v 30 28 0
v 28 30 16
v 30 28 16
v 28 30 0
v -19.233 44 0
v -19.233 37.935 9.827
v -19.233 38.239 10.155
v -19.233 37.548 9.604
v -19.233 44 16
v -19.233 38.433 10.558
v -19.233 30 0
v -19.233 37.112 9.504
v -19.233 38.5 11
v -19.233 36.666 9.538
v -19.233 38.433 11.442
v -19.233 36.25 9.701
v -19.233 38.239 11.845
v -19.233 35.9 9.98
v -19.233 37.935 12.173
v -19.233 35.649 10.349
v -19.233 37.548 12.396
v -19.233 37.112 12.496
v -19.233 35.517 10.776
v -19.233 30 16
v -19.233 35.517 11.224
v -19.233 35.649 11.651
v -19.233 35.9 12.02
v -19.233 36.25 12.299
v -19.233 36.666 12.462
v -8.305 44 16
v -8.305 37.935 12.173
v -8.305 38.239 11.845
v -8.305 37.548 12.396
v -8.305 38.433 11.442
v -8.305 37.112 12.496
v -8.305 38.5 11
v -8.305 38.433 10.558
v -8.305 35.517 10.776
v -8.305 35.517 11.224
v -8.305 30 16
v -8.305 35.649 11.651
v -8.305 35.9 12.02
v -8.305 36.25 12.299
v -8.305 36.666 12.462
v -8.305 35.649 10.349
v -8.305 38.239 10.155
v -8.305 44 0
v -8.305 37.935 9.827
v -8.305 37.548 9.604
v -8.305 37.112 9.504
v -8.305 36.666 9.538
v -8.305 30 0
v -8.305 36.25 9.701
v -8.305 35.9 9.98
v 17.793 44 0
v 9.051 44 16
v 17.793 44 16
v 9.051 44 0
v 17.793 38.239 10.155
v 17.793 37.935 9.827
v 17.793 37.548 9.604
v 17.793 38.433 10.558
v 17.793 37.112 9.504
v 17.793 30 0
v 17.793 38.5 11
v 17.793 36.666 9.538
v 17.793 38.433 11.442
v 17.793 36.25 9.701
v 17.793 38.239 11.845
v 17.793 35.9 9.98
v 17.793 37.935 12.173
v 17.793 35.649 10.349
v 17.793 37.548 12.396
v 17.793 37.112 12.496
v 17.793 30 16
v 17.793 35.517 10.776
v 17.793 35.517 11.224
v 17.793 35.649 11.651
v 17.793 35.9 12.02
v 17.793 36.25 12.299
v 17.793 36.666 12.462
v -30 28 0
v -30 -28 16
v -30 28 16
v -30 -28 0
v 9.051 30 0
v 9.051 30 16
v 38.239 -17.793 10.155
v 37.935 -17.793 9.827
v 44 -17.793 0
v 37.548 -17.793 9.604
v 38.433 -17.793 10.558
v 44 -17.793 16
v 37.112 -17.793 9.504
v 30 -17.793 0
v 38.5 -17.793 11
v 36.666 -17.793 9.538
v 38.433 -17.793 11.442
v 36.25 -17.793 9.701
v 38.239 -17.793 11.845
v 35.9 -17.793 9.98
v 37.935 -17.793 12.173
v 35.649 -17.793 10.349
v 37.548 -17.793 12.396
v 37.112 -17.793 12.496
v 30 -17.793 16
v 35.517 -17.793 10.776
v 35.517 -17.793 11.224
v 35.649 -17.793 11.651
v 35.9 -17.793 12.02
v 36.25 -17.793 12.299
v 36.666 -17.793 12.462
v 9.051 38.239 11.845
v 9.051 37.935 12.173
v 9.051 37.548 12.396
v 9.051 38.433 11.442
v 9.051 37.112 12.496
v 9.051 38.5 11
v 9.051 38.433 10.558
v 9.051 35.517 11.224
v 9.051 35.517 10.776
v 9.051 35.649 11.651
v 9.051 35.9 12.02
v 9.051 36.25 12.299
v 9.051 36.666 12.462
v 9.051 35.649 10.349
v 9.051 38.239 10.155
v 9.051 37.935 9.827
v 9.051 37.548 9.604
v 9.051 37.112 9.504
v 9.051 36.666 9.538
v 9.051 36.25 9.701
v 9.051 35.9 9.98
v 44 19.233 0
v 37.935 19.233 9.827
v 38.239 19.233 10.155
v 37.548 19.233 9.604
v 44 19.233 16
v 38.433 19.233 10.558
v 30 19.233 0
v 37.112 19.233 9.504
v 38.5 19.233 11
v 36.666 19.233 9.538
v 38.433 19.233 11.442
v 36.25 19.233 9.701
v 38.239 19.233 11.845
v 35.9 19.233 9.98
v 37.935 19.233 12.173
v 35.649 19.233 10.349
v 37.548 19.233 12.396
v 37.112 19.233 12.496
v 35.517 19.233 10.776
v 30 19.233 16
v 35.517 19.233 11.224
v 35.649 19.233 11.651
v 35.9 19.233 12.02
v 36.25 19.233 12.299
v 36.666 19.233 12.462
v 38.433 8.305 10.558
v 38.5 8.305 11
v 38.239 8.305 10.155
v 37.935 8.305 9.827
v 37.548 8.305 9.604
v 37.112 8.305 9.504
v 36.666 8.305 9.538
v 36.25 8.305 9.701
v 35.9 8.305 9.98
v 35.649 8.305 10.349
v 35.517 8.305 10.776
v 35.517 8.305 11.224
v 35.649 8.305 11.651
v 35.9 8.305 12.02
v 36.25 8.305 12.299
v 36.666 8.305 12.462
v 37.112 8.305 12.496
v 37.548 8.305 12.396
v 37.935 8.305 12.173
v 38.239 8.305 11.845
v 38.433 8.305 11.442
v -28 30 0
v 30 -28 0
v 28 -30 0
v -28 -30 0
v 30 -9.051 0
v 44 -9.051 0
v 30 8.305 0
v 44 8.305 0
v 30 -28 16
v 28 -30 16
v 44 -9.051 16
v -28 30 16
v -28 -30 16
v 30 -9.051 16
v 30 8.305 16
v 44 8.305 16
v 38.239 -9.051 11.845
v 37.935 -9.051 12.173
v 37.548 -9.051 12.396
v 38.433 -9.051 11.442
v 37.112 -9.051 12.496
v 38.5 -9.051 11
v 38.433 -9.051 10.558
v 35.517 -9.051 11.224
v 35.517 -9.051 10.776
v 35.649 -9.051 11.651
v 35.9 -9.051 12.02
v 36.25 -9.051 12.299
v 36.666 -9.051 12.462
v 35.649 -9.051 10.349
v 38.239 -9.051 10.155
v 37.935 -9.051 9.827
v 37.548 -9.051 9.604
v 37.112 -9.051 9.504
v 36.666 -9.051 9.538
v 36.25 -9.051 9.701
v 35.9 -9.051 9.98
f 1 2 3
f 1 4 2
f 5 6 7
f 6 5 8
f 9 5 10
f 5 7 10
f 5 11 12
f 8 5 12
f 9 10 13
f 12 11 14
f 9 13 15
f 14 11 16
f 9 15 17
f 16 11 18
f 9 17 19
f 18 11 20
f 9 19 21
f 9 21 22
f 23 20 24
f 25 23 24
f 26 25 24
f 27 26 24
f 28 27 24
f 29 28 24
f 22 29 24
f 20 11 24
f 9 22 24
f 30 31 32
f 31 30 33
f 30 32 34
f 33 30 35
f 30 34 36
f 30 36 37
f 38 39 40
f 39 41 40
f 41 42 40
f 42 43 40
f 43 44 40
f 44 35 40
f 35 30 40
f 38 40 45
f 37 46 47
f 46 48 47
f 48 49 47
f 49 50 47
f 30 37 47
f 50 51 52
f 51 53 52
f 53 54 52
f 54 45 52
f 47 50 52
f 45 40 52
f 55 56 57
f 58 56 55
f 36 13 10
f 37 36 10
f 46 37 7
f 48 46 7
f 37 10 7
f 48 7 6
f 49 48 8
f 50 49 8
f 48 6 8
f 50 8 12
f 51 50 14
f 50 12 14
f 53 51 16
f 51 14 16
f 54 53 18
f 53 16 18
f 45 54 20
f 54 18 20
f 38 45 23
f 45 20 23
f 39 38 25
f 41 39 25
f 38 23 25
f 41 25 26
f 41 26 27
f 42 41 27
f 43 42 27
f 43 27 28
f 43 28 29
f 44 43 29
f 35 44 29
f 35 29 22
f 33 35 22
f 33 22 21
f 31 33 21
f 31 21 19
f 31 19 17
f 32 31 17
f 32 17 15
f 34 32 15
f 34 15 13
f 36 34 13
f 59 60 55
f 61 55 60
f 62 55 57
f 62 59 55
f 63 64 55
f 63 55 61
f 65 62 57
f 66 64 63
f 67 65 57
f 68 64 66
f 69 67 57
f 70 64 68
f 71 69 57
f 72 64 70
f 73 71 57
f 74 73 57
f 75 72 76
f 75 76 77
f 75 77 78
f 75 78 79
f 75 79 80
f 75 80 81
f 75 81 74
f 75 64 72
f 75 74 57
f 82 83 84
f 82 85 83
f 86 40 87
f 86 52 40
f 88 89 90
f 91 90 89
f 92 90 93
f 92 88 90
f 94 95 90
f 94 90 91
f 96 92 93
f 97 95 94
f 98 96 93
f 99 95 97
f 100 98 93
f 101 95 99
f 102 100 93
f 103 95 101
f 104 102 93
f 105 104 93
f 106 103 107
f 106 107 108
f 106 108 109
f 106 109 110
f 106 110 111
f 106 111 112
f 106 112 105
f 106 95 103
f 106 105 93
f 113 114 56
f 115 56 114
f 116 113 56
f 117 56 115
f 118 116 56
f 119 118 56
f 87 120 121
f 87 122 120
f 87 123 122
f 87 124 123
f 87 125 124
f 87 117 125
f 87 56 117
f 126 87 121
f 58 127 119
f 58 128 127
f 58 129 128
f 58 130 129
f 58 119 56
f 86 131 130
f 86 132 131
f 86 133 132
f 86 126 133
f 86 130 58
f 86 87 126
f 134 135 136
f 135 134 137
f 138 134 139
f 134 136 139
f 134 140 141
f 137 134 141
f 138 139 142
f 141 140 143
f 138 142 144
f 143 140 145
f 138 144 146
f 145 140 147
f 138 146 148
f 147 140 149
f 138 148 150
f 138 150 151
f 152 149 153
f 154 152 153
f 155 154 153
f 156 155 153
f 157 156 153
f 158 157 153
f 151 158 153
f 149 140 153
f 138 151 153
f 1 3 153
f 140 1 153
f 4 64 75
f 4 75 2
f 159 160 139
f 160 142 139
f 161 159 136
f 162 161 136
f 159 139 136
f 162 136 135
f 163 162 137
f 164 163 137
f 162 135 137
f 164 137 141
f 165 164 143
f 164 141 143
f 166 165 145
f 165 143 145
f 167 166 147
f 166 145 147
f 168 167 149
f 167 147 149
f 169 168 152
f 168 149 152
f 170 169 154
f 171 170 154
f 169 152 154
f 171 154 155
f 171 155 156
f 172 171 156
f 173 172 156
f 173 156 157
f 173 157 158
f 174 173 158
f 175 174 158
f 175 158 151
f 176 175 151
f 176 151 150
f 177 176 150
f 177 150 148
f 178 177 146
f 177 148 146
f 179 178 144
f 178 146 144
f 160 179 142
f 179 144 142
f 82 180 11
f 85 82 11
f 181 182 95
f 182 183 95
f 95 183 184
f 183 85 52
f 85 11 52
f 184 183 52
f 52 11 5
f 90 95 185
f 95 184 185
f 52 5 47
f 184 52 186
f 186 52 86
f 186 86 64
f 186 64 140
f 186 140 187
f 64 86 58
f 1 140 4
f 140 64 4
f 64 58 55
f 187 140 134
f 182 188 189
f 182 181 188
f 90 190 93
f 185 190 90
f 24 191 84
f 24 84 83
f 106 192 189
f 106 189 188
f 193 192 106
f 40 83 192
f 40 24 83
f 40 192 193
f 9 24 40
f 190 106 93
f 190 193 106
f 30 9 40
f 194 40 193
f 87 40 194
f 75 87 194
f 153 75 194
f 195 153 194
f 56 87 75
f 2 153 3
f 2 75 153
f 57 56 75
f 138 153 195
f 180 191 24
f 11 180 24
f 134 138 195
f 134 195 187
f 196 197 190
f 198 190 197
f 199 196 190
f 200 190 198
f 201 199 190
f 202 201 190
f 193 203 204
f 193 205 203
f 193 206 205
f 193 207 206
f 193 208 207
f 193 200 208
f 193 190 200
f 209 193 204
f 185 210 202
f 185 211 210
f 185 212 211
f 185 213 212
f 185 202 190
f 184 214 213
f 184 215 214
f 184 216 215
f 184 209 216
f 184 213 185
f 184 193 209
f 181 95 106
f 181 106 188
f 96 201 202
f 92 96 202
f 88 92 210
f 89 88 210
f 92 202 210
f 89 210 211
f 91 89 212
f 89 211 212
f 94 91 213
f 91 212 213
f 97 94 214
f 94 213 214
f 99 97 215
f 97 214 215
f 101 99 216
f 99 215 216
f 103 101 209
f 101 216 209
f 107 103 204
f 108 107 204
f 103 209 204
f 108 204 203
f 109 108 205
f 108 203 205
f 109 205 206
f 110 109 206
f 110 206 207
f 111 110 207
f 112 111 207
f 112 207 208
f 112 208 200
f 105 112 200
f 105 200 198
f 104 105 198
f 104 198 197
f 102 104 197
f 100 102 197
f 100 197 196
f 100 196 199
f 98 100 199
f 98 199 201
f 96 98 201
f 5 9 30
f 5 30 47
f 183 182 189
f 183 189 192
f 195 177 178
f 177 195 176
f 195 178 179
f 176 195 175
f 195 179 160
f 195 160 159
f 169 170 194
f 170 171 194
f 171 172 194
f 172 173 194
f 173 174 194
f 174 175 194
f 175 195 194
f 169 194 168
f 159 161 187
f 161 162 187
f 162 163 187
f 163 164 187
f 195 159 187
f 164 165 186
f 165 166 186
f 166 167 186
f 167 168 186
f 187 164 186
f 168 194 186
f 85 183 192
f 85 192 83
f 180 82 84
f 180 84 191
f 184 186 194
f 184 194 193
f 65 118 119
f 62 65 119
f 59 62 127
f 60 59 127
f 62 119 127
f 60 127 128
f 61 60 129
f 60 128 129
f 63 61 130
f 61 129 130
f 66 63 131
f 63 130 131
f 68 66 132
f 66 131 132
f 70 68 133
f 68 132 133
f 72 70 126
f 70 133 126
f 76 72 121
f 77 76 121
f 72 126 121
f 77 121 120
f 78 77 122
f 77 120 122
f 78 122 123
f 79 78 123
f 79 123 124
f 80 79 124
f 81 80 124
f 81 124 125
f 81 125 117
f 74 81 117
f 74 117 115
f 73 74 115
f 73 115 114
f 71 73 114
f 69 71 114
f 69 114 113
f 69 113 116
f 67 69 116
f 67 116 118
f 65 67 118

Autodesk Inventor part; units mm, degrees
ref_plane "YZ Plane" through (0, 0, 0) normal (1, 0, 0) x (0, 1, 0)
ref_plane "XZ Plane" through (0, 0, 0) normal (0, 1, 0) x (-1, 0, 0)
ref_plane "XY Plane" through (0, 0, 0) normal (0, 0, 1) x (1, 0, 0)
ref_plane "Work Plane1" through (0, 0, 0) normal (0, 0, 1) x (1, 0, 0)
sketch "Sketch1" plane through (0, 0, 0) normal (0, 0, 1) x (1, 0, 0)
  circle A0 centre (17.5, 17.5) radius 1.95 projected
  circle A1 centre (17.5, -17.5) radius 1.95 projected
  circle A2 centre (-17.5, -17.5) radius 1.95 projected
  circle A3 centre (-17.5, 17.5) radius 1.95 projected
  circle A4 centre (0, 0) radius 7.5 projected
  line L0 (-30, 28) -> (-28, 30) projected
  line L1 (-30, -28) -> (-30, 28) projected
  line L2 (-28, -30) -> (-30, -28) projected
  line L3 (28, -30) -> (-28, -30) projected
  line L4 (30, -28) -> (28, -30) projected
  line L5 (30, 28) -> (30, -28) projected
  line L6 (28, 30) -> (30, 28) projected
  line L7 (-28, 30) -> (28, 30) projected
  circle A5 centre (25, 25) radius 2.325 projected
  circle A6 centre (-25, -25) radius 2.325 projected
  circle A7 centre (25, -25) radius 2.325 projected
  circle A8 centre (-25, 25) radius 2.325 projected
  circle A9 centre (10, -25) radius 1.45 projected
  circle A10 centre (10, 25) radius 1.45 projected
  circle A11 centre (-10, 25) radius 1.45 projected
  circle A12 centre (-10, -25) radius 1.45 projected
  circle A13 centre (-25, -10) radius 1.45 projected
  circle A14 centre (25, -10) radius 1.45 projected
  circle A15 centre (25, 10) radius 1.45 projected
  circle A16 centre (-25, 10) radius 1.45 projected
  point P0 (0, 0)
extrude "Extrusion1" add sketch "Sketch1" along normal blind 16 contours A0 | A1 | A2 | A3 | A4 | L0 L7 L6 L5 L4 L3 L2 L1 | A5 | A6 | A7 | A8 | A9 | A10 | A11 | A12 | A13 | A14 | A15 | A16
sketch "Sketch2" plane through (0, 0, 16) normal (0, 0, 1) x (1, 0, 0)
  point P0 (0, 0)
sketch "Sketch3" plane through (30, -28, 0) normal (1, 0, 0) x (0, 0, -1)
  line L0 (0, 56) -> (0, 0) projected
  line L1 (0, 56) -> (-16, 56) projected
  line L2 (-16, 0) -> (-16, 56) projected
  line L3 (0, 0) -> (-16, 0) projected
  line L4 (-16, 0) -> (-16, 56) projected
  line L5 (0, 47.2331) -> (-16, 47.2331)
  line L6 (-16, 47.2331) -> (-16, 36.3051)
  line L7 (-16, 36.3051) -> (0, 36.3051)
  line L8 (0, 36.3051) -> (0, 47.2331)
  line L9 (0, 56) -> (0, 0) projected
  line L10 (0, 10.2066) -> (-16, 10.2066)
  line L11 (-16, 10.2066) -> (-16, 18.9489)
  line L12 (-16, 18.9489) -> (0, 18.9489)
  line L13 (0, 18.9489) -> (0, 10.2066)
  point P0 (0, 28)
extrude "Extrusion2" add sketch "Sketch3" along normal blind 14 contours L0 L7 L2 L5 | L0 L10 L2 L12
sketch "Sketch4" plane through (30, 19.2331, 16) normal (0, 1, 0) x (1, 0, 0)
  line L0 (0, 0) -> (0, 16) projected
  line L1 (0, 0) -> (14, 0) projected
  line L2 (14, 16) -> (14, 0) projected
  line L3 (0, 16) -> (14, 16) projected
  circle A0 centre (7, 5) radius 1.5
  point P0 (-30, 16)
  dimension "d4" = 3
extrude "Extrusion3" cut sketch "Sketch4" against normal through all contours A0
pattern_circular "Circular Pattern1" count 2 over 90 about axis through (0, 0, 0) along (0, 0, 1) of "Extrusion2", "Extrusion3"
properties part number "00_XY_stage-CHUO_SEIKI_LD-647-R1-Middle"
